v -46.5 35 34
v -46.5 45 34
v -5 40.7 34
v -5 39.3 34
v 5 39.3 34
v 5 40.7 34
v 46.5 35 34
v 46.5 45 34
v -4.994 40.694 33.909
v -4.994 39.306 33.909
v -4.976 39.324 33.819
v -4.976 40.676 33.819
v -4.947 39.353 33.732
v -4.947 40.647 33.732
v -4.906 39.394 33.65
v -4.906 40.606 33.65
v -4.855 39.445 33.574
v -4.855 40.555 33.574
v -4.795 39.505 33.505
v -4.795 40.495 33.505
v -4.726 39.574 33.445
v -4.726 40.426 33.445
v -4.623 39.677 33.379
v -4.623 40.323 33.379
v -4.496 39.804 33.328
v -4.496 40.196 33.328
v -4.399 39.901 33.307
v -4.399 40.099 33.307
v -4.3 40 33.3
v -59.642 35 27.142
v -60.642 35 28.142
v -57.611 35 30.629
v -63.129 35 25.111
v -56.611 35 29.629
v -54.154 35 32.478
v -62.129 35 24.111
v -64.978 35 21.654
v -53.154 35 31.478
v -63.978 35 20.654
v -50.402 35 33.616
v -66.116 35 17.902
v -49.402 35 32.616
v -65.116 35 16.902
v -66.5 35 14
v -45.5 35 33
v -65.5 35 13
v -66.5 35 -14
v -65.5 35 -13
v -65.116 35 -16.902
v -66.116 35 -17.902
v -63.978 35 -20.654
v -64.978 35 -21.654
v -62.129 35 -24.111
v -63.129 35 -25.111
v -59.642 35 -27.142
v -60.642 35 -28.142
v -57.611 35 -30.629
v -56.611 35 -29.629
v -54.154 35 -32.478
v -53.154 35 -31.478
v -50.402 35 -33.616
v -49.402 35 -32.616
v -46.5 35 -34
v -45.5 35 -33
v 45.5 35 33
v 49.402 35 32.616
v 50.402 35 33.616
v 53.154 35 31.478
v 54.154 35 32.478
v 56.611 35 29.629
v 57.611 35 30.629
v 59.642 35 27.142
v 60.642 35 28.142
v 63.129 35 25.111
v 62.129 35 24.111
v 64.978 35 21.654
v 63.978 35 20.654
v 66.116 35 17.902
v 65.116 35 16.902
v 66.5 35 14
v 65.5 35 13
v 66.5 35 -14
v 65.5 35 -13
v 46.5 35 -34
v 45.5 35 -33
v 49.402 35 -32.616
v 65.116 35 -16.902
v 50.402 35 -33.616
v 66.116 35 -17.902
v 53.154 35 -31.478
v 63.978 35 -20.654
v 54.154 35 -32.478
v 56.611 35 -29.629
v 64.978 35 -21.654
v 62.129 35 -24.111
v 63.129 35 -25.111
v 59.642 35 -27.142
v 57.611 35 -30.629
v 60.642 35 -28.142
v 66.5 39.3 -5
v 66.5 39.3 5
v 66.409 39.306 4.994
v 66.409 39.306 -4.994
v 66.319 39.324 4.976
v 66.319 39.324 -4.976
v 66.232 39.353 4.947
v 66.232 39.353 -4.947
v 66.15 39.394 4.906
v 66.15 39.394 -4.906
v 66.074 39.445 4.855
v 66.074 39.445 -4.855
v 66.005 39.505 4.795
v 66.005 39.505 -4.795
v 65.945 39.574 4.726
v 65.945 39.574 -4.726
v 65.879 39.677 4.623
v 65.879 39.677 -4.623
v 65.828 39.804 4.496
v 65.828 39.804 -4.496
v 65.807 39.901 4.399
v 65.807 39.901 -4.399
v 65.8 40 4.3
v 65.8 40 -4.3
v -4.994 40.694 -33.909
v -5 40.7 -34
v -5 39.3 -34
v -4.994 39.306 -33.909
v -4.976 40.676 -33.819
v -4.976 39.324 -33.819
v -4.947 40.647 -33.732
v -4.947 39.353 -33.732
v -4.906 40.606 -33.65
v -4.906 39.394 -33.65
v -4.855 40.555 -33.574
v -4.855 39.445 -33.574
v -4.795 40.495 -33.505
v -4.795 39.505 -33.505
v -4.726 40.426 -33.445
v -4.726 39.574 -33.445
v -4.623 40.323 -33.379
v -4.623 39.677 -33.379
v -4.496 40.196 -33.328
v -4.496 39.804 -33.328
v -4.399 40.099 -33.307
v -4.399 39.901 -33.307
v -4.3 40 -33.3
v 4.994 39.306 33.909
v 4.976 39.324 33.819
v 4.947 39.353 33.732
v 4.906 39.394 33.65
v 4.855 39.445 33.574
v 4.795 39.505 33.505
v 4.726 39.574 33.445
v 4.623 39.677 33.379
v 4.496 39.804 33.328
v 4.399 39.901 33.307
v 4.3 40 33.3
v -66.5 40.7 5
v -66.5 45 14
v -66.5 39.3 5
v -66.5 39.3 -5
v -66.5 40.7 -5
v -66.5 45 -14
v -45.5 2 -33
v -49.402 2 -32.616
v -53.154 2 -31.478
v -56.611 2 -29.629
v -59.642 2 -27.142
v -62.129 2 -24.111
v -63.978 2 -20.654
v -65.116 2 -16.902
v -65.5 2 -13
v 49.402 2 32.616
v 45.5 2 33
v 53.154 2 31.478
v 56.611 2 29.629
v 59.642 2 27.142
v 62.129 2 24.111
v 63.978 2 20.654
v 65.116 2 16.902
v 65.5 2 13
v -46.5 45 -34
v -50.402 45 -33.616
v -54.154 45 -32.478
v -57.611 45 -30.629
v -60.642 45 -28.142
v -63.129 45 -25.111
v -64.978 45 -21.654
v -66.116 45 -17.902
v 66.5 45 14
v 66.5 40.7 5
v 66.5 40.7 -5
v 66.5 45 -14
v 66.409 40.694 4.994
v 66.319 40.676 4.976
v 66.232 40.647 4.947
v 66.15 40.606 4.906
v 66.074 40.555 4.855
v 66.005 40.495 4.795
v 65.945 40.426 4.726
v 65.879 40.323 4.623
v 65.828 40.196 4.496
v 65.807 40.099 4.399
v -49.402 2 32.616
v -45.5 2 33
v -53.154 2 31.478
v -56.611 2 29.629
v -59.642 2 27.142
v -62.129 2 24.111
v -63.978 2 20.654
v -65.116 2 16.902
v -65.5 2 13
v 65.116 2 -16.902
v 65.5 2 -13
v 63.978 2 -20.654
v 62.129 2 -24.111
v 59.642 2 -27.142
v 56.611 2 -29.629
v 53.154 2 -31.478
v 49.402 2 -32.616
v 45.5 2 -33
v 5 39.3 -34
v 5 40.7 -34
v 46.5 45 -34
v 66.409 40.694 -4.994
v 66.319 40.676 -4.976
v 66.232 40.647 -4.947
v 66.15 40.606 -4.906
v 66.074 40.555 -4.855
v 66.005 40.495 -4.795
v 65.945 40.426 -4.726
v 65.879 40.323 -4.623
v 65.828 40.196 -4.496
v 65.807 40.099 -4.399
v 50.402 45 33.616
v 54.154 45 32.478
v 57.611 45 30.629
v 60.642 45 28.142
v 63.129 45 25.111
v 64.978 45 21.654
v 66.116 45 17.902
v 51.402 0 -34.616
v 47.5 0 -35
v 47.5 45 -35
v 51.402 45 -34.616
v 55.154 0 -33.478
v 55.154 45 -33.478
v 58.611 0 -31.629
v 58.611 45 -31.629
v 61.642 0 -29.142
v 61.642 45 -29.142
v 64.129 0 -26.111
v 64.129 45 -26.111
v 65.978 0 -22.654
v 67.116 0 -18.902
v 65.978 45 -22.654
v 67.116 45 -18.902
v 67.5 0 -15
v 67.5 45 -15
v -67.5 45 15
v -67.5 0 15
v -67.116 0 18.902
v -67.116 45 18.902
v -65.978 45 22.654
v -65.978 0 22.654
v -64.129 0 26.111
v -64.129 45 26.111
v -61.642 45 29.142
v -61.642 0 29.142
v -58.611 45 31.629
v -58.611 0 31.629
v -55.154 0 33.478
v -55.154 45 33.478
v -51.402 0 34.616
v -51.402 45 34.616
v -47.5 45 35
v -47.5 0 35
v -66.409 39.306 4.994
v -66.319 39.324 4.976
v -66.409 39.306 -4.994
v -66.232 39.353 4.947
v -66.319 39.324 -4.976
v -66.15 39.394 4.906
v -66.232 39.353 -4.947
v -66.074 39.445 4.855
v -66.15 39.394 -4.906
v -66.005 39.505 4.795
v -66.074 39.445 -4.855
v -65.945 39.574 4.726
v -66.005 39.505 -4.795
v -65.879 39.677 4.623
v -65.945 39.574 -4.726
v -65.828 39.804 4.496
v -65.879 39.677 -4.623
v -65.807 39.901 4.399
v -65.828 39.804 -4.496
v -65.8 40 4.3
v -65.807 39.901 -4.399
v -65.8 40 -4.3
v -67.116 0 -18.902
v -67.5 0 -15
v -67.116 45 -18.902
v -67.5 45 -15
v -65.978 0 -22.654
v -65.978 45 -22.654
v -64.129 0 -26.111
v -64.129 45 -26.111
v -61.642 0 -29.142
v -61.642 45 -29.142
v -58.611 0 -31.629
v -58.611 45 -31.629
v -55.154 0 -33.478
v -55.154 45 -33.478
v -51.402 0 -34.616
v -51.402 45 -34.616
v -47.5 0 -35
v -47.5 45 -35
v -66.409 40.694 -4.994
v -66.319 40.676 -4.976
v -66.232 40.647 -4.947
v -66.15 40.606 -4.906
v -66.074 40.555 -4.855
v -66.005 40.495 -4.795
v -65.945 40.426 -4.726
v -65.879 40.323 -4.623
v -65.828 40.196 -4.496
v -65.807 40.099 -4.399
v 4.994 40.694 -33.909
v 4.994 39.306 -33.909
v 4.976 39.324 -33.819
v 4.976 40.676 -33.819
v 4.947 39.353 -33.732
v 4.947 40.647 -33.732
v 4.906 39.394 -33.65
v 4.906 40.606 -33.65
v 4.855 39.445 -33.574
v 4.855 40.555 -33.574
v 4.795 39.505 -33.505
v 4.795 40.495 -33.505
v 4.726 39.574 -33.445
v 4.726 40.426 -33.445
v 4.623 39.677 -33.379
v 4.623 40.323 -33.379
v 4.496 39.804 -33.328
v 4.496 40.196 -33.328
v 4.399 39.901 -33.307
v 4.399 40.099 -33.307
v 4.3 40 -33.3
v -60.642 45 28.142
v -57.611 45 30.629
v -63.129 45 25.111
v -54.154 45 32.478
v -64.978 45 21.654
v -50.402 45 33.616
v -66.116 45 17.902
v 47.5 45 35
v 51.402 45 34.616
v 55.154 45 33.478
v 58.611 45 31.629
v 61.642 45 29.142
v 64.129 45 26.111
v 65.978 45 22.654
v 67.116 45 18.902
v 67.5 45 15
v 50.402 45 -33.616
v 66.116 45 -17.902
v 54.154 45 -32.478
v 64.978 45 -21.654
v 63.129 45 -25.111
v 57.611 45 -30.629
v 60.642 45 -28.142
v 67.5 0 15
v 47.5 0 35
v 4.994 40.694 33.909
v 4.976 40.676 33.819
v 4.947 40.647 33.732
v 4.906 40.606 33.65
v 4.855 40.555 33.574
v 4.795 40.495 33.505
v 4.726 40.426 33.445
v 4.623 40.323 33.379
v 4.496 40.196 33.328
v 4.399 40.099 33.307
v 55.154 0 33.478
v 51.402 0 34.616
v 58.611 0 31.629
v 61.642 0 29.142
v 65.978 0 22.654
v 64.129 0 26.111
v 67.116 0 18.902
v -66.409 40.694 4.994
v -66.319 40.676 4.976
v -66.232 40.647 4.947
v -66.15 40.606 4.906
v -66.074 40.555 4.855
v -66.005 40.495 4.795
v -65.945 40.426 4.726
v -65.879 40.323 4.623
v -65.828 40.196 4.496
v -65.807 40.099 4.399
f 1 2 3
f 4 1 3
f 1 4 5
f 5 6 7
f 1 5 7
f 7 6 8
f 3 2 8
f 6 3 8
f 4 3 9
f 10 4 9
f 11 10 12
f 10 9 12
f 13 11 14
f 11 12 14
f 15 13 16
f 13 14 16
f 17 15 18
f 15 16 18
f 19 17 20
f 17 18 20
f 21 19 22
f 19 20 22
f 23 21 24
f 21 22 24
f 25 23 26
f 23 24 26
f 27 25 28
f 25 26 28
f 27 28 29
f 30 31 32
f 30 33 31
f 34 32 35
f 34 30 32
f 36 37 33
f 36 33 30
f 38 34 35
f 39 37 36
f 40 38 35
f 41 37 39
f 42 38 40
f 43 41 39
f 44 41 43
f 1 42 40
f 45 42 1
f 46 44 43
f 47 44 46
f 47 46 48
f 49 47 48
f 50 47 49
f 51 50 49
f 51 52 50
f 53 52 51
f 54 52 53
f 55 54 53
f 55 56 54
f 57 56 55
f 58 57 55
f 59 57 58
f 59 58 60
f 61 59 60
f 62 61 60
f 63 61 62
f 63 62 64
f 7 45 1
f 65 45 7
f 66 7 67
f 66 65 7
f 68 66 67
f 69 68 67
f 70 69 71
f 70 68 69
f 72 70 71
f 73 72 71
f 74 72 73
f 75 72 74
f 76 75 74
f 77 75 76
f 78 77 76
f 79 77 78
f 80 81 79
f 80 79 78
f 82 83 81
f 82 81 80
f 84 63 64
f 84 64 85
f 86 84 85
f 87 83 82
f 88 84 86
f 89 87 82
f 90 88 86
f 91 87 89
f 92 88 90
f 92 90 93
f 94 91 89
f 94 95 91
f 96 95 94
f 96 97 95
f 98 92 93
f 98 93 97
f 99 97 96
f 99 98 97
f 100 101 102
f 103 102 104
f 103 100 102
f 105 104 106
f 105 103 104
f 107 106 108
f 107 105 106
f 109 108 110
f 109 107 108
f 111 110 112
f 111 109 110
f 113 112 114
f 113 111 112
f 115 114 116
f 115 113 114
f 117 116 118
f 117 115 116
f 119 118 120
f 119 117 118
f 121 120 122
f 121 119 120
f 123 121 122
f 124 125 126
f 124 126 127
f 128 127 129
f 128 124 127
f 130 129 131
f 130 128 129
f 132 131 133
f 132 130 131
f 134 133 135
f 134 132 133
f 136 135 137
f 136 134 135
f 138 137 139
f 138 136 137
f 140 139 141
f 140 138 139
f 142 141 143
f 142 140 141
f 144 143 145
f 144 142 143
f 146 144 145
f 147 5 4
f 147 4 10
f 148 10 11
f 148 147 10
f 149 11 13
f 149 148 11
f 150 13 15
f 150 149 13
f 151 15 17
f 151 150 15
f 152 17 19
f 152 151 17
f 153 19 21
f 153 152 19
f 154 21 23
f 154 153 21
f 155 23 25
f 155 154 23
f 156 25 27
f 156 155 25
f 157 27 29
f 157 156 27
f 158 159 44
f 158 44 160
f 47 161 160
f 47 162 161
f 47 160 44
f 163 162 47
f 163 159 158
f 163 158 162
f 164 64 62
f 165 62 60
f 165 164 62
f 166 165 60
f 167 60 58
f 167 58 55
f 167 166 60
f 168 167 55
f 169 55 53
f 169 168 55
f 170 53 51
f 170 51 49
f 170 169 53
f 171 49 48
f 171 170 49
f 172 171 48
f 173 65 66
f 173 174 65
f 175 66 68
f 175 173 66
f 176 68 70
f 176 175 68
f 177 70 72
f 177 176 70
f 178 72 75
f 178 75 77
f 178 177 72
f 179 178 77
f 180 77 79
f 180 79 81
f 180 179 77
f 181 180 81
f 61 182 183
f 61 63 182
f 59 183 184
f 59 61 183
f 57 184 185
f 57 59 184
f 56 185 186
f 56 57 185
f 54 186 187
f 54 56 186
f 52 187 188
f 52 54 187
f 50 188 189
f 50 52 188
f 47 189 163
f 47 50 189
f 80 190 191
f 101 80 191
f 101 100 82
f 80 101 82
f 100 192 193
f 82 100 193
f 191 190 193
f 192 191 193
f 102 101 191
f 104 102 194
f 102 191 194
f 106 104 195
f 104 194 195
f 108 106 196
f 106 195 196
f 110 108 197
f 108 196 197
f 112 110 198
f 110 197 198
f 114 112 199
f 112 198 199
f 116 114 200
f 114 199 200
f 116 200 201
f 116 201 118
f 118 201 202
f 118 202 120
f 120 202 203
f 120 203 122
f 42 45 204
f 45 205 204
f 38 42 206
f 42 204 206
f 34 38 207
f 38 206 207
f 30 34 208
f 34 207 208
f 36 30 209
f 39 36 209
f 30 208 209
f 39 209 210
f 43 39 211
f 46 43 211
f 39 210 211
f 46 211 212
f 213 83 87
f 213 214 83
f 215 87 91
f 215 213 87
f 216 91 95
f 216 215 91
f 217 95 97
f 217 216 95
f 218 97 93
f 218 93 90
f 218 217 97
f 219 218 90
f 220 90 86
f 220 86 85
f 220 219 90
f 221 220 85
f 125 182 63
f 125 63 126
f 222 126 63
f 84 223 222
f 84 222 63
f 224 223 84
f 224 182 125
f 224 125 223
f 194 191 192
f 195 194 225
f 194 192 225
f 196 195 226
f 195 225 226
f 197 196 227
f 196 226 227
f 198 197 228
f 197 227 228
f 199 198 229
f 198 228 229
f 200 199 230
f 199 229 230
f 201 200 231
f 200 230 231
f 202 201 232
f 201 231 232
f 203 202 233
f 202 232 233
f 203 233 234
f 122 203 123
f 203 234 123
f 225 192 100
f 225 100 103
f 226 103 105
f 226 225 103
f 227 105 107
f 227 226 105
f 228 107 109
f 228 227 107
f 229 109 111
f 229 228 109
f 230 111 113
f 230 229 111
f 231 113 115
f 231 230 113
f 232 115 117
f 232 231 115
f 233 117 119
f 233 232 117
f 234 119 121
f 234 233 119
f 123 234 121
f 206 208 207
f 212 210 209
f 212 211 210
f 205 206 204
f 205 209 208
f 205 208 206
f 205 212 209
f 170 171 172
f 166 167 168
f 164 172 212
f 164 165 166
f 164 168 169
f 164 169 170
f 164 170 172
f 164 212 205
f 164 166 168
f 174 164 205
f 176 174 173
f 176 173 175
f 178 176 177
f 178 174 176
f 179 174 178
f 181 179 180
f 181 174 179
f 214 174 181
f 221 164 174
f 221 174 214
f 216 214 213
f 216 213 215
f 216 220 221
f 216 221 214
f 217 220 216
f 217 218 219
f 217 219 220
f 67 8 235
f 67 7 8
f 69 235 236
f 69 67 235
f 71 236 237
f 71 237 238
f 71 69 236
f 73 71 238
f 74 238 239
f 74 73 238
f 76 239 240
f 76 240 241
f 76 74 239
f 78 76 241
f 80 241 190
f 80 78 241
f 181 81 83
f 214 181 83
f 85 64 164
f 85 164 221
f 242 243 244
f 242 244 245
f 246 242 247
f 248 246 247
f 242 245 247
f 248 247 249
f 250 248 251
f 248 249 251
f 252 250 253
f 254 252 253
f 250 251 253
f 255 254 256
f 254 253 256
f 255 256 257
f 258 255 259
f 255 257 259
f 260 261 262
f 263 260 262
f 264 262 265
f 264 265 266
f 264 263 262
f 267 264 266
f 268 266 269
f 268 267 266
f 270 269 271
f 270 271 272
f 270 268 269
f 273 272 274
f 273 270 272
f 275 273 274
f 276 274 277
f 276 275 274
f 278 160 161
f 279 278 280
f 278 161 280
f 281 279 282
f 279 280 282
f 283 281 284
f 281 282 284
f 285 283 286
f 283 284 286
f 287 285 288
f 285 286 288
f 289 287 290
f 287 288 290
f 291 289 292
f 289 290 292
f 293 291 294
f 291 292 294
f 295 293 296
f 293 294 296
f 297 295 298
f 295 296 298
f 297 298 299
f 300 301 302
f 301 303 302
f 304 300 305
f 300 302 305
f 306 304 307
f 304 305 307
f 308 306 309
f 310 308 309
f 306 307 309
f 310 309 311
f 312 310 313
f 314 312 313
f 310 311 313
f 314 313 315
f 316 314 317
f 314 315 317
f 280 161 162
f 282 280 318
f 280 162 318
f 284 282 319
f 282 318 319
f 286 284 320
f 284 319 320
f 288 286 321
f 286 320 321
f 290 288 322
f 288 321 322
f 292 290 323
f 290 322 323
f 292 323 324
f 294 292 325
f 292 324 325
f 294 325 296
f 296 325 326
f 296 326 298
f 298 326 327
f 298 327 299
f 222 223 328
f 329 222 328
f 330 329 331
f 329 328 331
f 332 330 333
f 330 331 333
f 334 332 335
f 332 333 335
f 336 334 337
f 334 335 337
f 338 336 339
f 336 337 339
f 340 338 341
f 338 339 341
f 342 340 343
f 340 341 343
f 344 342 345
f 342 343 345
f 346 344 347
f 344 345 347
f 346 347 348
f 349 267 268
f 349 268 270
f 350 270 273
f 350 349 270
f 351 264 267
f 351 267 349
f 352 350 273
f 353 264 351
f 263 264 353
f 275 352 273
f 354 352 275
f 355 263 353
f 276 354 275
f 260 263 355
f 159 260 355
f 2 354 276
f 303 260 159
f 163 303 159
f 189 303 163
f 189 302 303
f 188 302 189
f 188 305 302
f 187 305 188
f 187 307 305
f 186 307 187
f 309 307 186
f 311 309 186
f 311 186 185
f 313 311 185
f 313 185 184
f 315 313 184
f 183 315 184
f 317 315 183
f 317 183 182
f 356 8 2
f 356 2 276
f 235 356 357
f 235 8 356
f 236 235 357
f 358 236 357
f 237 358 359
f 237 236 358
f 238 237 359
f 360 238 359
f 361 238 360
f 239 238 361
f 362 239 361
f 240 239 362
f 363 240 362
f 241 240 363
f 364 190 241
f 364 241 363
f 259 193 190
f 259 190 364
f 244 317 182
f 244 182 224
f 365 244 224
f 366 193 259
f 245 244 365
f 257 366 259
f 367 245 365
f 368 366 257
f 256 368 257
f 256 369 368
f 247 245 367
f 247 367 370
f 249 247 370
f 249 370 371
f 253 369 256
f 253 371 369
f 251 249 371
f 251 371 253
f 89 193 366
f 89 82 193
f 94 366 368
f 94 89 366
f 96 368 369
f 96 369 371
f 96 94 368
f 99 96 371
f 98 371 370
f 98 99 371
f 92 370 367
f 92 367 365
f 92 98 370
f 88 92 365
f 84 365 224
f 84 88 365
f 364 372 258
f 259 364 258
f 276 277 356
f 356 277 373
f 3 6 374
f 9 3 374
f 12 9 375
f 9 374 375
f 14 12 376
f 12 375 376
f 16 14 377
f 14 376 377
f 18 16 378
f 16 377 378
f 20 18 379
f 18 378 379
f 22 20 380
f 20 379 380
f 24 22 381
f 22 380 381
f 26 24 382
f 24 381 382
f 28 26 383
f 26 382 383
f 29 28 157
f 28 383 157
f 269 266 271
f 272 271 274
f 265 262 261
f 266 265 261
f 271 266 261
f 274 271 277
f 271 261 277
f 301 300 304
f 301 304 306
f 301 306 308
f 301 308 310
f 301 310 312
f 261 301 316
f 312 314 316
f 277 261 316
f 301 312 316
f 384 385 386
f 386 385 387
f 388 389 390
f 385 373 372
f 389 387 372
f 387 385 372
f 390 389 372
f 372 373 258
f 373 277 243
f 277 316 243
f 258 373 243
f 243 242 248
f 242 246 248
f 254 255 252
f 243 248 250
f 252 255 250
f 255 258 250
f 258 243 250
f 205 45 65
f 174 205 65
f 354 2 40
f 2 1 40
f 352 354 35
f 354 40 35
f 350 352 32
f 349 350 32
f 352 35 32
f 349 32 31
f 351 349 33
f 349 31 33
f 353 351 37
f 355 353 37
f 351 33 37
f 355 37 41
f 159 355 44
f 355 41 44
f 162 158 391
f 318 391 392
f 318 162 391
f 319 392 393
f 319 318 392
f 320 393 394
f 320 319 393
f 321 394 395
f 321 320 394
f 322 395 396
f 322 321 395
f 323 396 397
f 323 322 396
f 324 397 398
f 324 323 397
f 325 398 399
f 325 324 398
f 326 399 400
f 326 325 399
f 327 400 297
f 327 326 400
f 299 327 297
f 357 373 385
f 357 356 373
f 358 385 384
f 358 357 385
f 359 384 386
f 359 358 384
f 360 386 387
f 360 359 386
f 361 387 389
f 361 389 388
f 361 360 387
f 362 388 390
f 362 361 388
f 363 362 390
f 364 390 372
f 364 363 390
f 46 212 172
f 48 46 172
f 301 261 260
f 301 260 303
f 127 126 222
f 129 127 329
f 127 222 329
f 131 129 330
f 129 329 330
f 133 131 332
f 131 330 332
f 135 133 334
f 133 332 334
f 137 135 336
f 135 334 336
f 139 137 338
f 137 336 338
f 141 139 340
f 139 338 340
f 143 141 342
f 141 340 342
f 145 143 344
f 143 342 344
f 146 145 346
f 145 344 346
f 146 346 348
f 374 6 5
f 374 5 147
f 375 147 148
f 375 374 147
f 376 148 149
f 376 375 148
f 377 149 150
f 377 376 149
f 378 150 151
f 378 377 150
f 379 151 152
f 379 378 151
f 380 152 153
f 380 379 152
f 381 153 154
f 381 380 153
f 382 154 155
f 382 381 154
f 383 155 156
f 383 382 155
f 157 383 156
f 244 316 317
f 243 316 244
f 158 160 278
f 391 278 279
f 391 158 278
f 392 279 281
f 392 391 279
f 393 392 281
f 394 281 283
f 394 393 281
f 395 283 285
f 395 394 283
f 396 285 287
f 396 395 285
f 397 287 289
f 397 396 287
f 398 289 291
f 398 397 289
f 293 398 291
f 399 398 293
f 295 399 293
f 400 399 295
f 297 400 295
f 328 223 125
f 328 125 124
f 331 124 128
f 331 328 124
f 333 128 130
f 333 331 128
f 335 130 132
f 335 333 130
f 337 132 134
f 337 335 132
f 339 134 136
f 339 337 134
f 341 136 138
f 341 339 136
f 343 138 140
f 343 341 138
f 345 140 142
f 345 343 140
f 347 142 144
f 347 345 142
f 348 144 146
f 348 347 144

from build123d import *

# Parameters (mm, degrees)
SKETCH_1_W             = 135
SKETCH_1_H             = 70
EXTRUDE_1_DEPTH        = 45
SKETCH_2_W             = 133
SKETCH_2_H             = 68
CUT_EXTRUDE_1_DEPTH    = 10
SKETCH_4_W             = 131
SKETCH_4_H             = 66
CUT_EXTRUDE_3_DEPTH    = 33
FILLET_3_R             = 20
SKETCH_5_W             = 10
SKETCH_5_H             = 1.4
EXTRUDE_2_DEPTH        = 0.7
FILLET_5_R             = 0.7
FILLET_5_OF_MIRROR_2_R = 0.7
SKETCH_6_W             = 10
SKETCH_6_H             = 1.4
EXTRUDE_3_DEPTH        = 0.7
FILLET_6_R             = 0.7
FILLET_6_OF_MIRROR_3_R = 0.7


with BuildPart() as part:
    # 草图1 → 凸台-拉伸1 (new body)
    with BuildSketch(Plane(origin=(0, 0, 0), x_dir=(1, 0, 0), z_dir=(0, 1, 0))):
        Rectangle(SKETCH_1_W, SKETCH_1_H)
    extrude(amount=EXTRUDE_1_DEPTH)

    # 草图2 → 切除-拉伸1 (cut)
    with BuildSketch(Plane(origin=(0, 45, 0), x_dir=(1, 0, 0), z_dir=(0, 1, 0))):
        Rectangle(SKETCH_2_W, SKETCH_2_H)
    extrude(amount=-CUT_EXTRUDE_1_DEPTH, mode=Mode.SUBTRACT)

    # 草图4 → 切除-拉伸3 (cut)
    with BuildSketch(Plane(origin=(0, 35, 0), x_dir=(1, 0, 0), z_dir=(0, 1, 0))):
        Rectangle(SKETCH_4_W, SKETCH_4_H)
    extrude(amount=-CUT_EXTRUDE_3_DEPTH, mode=Mode.SUBTRACT)

    # 圆角3
    fillet_3_edges = [part.edges().sort_by_distance(p)[0] for p in [
        (-66.5, 40, -34),
        (66.5, 40, -34),
        (66.5, 40, 34),
        (-66.5, 40, 34),
        (65.5, 18.5, -33),
        (-65.5, 18.5, -33),
        (-65.5, 18.5, 33),
        (65.5, 18.5, 33),
        (-67.5, 22.5, 35),
        (67.5, 22.5, 35),
        (67.5, 22.5, -35),
        (-67.5, 22.5, -35),
    ]]
    fillet(fillet_3_edges, radius=FILLET_3_R)

    # 草图5 → 凸台-拉伸2 (add)
    with BuildSketch(Plane.XY.offset(-34)):
        with Locations((0, 40)):
            Rectangle(SKETCH_5_W, SKETCH_5_H)
    extrude_2 = extrude(amount=EXTRUDE_2_DEPTH)

    # 圆角5
    fillet_5_edges = [part.edges().sort_by_distance(p)[0] for p in [
        (5, 40, -33.3),
        (-5, 40, -33.3),
        (0, 39.3, -33.3),
        (0, 40.7, -33.3),
    ]]
    fillet(fillet_5_edges, radius=FILLET_5_R - 0.0001)  # a hair under: the kernel refuses the full size

    # 镜向2: 凸台-拉伸2 across plane
    add(extrude_2.mirror(Plane.XY))

    # 圆角5 of 镜向2
    fillet_5_of_mirror_2_edges = [part.edges().sort_by_distance(p)[0] for p in [
        (5, 40, 33.3),
        (-5, 40, 33.3),
        (0, 39.3, 33.3),
        (0, 40.7, 33.3),
    ]]
    fillet(fillet_5_of_mirror_2_edges, radius=FILLET_5_OF_MIRROR_2_R - 0.0001)  # a hair under: the kernel refuses the full size

    # 草图6 → 凸台-拉伸3 (add)
    with BuildSketch(Plane(origin=(-66.5, 0, 0), x_dir=(0, 0, -1), z_dir=(1, 0, 0))):
        with Locations((0, 40)):
            Rectangle(SKETCH_6_W, SKETCH_6_H)
    extrude_3 = extrude(amount=EXTRUDE_3_DEPTH)

    # 圆角6
    fillet_6_edges = [part.edges().sort_by_distance(p)[0] for p in [
        (-65.8, 40, -5),
        (-65.8, 40, 5),
        (-65.8, 39.3, 0),
        (-65.8, 40.7, 0),
    ]]
    fillet(fillet_6_edges, radius=FILLET_6_R - 0.0001)  # a hair under: the kernel refuses the full size

    # 镜向3: 凸台-拉伸3 across plane
    add(extrude_3.mirror(Plane(origin=(0, 0, 0), x_dir=(0, 0, 1), z_dir=(1, 0, 0))))

    # 圆角6 of 镜向3
    fillet_6_of_mirror_3_edges = [part.edges().sort_by_distance(p)[0] for p in [
        (65.8, 40, -5),
        (65.8, 40, 5),
        (65.8, 39.3, 0),
        (65.8, 40.7, 0),
    ]]
    fillet(fillet_6_of_mirror_3_edges, radius=FILLET_6_OF_MIRROR_3_R - 0.0001)  # a hair under: the kernel refuses the full size


solid = part.part
